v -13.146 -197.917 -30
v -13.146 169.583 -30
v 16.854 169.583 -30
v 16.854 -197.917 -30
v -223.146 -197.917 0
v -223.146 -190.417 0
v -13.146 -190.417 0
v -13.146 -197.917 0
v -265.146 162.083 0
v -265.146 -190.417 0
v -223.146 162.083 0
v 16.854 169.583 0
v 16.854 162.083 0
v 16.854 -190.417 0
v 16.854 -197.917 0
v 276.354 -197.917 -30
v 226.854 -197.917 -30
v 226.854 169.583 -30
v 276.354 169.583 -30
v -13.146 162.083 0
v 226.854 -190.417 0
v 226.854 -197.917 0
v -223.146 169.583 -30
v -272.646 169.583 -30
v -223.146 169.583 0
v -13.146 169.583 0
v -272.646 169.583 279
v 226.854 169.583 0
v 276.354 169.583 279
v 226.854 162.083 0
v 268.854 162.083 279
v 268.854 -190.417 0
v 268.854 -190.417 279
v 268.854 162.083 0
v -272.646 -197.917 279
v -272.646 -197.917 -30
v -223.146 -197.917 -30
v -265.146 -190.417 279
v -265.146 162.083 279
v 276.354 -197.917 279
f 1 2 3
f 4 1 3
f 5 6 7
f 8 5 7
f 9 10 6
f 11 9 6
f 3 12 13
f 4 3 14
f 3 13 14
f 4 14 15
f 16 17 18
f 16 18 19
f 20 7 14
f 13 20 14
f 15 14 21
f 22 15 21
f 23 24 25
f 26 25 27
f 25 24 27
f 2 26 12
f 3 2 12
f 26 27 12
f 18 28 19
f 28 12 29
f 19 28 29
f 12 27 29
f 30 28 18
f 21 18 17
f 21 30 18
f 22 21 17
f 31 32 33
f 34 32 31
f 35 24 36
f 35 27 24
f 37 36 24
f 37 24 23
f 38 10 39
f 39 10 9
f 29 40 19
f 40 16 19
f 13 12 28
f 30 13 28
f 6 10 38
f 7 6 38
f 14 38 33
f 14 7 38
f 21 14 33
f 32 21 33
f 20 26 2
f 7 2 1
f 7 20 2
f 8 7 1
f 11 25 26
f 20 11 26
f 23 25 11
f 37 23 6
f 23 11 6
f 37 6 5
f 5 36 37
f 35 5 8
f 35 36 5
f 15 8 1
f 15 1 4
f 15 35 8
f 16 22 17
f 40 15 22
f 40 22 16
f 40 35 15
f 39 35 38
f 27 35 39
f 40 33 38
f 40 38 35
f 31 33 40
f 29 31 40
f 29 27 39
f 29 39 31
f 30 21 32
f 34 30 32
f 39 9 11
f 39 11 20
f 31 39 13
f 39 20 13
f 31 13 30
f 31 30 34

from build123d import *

# Parameters (mm, degrees)
F0_W     = 549
F0_H     = 367.5
F1_DEPTH = 279
F2_T     = -7.5
F3_W     = 49.5
F3_H     = 367.5
F3_W_2   = 30
F4_DEPTH = 30


with BuildPart() as f1:
    # F0 (on Top) → F1 (new body)
    with BuildSketch(Plane.XY):
        with Locations((1.85414, -14.167297)):
            Rectangle(F0_W, F0_H)
    extrude(amount=F1_DEPTH)

    # F2
    f2_openings = [f1.faces().sort_by_distance(p)[0] for p in [
        (1.85414, -14.167297, 279),
        (1.85414, -14.167297, 0),
    ]]
    offset(amount=F2_T, openings=f2_openings)

    # F3 (on face) → F4 (join)
    with BuildSketch(Plane(origin=(0, 0, 0), x_dir=(1, 0, 0), z_dir=(0, 0, -1))):
        with Locations((-247.89586, 14.167297)):
            Rectangle(F3_W, F3_H)
        with Locations((1.85414, 14.167297)):
            Rectangle(F3_W_2, F3_H)
        with Locations((251.60414, 14.167297)):
            Rectangle(F3_W, F3_H)
    extrude(amount=F4_DEPTH)


solid = f1.part
